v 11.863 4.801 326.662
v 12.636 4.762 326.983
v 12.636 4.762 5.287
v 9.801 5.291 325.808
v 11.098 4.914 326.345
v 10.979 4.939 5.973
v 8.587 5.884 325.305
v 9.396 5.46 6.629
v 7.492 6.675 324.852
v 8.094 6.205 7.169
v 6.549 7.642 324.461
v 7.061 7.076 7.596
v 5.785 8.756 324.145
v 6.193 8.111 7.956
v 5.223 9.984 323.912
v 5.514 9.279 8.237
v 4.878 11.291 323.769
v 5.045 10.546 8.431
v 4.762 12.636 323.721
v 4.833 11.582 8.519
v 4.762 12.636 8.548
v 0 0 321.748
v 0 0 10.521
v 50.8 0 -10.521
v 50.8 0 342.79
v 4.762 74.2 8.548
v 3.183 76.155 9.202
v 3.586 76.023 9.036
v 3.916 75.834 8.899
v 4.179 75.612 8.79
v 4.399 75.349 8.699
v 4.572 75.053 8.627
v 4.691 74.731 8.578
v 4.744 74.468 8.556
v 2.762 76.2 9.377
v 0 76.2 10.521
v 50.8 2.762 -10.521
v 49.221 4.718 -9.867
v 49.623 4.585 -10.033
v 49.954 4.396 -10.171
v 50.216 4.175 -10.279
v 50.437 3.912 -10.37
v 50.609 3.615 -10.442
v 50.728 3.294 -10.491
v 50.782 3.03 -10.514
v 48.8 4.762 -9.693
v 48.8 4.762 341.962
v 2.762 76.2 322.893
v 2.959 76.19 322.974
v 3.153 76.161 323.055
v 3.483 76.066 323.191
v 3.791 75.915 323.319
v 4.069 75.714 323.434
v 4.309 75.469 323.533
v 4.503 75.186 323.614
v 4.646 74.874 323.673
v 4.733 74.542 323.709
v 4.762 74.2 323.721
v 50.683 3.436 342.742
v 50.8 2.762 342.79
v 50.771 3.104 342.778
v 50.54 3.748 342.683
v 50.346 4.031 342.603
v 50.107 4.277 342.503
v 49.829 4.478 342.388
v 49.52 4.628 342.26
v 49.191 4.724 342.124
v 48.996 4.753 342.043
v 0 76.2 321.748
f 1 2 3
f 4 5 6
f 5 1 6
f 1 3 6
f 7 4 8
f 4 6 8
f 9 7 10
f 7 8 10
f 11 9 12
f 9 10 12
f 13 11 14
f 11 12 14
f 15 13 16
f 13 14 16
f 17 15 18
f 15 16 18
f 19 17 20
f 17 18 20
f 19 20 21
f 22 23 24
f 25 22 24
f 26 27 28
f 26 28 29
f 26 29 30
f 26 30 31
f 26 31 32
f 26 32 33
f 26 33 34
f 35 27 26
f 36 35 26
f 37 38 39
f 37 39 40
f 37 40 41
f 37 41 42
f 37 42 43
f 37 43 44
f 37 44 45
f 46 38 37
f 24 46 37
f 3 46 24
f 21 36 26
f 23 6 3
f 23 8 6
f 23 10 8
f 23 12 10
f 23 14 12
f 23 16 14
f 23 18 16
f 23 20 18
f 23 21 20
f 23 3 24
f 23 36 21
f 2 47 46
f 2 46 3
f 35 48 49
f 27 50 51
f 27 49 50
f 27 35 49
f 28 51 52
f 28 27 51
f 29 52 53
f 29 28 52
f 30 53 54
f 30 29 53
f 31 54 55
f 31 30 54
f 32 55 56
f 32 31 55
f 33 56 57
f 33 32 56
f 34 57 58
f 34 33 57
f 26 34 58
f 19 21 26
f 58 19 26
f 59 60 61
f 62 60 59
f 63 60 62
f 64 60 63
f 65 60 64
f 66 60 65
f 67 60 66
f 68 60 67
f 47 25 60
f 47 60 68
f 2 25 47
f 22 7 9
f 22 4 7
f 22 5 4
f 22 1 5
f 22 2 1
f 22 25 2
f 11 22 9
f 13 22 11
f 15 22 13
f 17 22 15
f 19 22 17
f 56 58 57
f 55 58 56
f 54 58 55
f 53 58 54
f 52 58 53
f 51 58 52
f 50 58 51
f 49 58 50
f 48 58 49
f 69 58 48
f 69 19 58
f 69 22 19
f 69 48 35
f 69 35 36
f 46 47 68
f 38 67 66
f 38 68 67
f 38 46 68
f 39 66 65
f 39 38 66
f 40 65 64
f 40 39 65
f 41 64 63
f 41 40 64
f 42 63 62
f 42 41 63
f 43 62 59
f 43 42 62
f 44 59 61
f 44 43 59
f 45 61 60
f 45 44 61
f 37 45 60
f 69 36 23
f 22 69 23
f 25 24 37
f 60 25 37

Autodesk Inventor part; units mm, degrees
ref_plane "Start plane" through (0, 0, -10.521) normal (0, 0, 1) x (1, 0, 0)
ref_plane "End plane" through (0, 0, 342.7905) normal (0, 0, 1) x (1, 0, 0)
sketch "Sketch" plane through (0, 0, 0) normal (0, 0, 1) x (1, 0, 0)
  line L0 (0, 76.2) -> (0, 0)
  line L1 (0, 0) -> (50.8, 0)
  line L2 (50.8, 0) -> (50.8, 2.7625)
  line L3 (48.8, 4.7625) -> (12.6365, 4.7625)
  line L4 (4.7625, 12.6365) -> (4.7625, 74.2)
  line L5 (2.7625, 76.2) -> (0, 76.2)
  line L6 (-7.0414, 0) -> (21.5385, 0) construction
  line L7 (0, -8.0414) -> (0, 34.5385) construction
  arc A0 (4.7625, 12.6365) -> (12.6365, 4.7625) centre (12.6365, 12.6365) ccw
  arc A1 (50.8, 2.7625) -> (48.8, 4.7625) centre (48.8, 2.7625) ccw
  arc A2 (4.7625, 74.2) -> (2.7625, 76.2) centre (2.7625, 74.2) ccw
  line L8 (0, 93.5453) -> (0, -24.9725) construction
  line L9 (-18.6925, 0) -> (62.8653, 0) construction
  point P0 (50.8, 4.7625)
  point P1 (4.7625, 4.7625)
  point P2 (4.7625, 76.2)
  dimension "d12" = 4.7625
  dimension "d13" = 76.2
  dimension "d14" = 50.8
  dimension "d15" = 0
  dimension "d16" = 4.7625
  dimension "d17" = 0
  dimension "d18" = 7.874
  dimension "d19" = 2
extrude "Body" add sketch "Sketch" along normal up to surface (353.3115 mm away) from surface at -10.521
sketch "Sketch3" plane through (0, 0, 0) normal (0, 0, 1) x (1, 0, 0)
  line L0 (0, 0) -> (10, 0)
ref_plane "Work Plane5" through (0, 0, 0) normal (0, -1, 0) x (1, 0, 0)
sketch "Sketch4" plane through (0, 0, 0) normal (0, -1, 0) x (1, 0, 0)
  line L0 (-2, -10.521) -> (12, -10.521)
  line L1 (-2, 342.7905) -> (12, 342.7905)
  dimension "d23" = 353.3115
ref_plane "Work Plane3" through (50.8, 38.1, -10.521) normal (-0.3827, 0, -0.9239) x (-0.9239, 0, 0.3827)
split "Split1" plane through (50.8, 38.1, -10.521) removes the side toward (-0.3827, 0, -0.9239)
ref_plane "Work Plane4" through (50.8, 38.1, 342.7905) normal (-0.3827, 0, 0.9239) x (0.9239, 0, 0.3827)
split "Split2" plane through (50.8, 38.1, 342.7905) removes the side toward (-0.3827, 0, 0.9239)
equation "\"d12\" = G_T"
equation "\"d13\" = G_H"
equation "\"d14\" = G_W"
equation "\"d16\" = G_T"
equation "\"d18\" = G_IR"
equation "\"d4\" = G_L"
equation "\"G_W\" = 50.8"
equation "\"G_H\" = 76.2"
equation "\"G_T\" = 4.7625"
equation "\"G_ER\" = 4.064"
equation "\"G_IR\" = 7.874"
equation "\"G_L\" = d23"
equation "\"ex\" = 0"
equation "\"ey\" = 0"
equation "\"G_OFFSET_START\" = 10.52102"
equation "\"G_OFFSET_END\" = 10.52102"
equation "\"d20\" = -G_OFFSET_START"
equation "\"d21\" = G_OFFSET_END + B_L"
equation "\"B_L\" = 332.26948"
properties part number "ANSI L 3 x 2 x 3_16 00000002"
